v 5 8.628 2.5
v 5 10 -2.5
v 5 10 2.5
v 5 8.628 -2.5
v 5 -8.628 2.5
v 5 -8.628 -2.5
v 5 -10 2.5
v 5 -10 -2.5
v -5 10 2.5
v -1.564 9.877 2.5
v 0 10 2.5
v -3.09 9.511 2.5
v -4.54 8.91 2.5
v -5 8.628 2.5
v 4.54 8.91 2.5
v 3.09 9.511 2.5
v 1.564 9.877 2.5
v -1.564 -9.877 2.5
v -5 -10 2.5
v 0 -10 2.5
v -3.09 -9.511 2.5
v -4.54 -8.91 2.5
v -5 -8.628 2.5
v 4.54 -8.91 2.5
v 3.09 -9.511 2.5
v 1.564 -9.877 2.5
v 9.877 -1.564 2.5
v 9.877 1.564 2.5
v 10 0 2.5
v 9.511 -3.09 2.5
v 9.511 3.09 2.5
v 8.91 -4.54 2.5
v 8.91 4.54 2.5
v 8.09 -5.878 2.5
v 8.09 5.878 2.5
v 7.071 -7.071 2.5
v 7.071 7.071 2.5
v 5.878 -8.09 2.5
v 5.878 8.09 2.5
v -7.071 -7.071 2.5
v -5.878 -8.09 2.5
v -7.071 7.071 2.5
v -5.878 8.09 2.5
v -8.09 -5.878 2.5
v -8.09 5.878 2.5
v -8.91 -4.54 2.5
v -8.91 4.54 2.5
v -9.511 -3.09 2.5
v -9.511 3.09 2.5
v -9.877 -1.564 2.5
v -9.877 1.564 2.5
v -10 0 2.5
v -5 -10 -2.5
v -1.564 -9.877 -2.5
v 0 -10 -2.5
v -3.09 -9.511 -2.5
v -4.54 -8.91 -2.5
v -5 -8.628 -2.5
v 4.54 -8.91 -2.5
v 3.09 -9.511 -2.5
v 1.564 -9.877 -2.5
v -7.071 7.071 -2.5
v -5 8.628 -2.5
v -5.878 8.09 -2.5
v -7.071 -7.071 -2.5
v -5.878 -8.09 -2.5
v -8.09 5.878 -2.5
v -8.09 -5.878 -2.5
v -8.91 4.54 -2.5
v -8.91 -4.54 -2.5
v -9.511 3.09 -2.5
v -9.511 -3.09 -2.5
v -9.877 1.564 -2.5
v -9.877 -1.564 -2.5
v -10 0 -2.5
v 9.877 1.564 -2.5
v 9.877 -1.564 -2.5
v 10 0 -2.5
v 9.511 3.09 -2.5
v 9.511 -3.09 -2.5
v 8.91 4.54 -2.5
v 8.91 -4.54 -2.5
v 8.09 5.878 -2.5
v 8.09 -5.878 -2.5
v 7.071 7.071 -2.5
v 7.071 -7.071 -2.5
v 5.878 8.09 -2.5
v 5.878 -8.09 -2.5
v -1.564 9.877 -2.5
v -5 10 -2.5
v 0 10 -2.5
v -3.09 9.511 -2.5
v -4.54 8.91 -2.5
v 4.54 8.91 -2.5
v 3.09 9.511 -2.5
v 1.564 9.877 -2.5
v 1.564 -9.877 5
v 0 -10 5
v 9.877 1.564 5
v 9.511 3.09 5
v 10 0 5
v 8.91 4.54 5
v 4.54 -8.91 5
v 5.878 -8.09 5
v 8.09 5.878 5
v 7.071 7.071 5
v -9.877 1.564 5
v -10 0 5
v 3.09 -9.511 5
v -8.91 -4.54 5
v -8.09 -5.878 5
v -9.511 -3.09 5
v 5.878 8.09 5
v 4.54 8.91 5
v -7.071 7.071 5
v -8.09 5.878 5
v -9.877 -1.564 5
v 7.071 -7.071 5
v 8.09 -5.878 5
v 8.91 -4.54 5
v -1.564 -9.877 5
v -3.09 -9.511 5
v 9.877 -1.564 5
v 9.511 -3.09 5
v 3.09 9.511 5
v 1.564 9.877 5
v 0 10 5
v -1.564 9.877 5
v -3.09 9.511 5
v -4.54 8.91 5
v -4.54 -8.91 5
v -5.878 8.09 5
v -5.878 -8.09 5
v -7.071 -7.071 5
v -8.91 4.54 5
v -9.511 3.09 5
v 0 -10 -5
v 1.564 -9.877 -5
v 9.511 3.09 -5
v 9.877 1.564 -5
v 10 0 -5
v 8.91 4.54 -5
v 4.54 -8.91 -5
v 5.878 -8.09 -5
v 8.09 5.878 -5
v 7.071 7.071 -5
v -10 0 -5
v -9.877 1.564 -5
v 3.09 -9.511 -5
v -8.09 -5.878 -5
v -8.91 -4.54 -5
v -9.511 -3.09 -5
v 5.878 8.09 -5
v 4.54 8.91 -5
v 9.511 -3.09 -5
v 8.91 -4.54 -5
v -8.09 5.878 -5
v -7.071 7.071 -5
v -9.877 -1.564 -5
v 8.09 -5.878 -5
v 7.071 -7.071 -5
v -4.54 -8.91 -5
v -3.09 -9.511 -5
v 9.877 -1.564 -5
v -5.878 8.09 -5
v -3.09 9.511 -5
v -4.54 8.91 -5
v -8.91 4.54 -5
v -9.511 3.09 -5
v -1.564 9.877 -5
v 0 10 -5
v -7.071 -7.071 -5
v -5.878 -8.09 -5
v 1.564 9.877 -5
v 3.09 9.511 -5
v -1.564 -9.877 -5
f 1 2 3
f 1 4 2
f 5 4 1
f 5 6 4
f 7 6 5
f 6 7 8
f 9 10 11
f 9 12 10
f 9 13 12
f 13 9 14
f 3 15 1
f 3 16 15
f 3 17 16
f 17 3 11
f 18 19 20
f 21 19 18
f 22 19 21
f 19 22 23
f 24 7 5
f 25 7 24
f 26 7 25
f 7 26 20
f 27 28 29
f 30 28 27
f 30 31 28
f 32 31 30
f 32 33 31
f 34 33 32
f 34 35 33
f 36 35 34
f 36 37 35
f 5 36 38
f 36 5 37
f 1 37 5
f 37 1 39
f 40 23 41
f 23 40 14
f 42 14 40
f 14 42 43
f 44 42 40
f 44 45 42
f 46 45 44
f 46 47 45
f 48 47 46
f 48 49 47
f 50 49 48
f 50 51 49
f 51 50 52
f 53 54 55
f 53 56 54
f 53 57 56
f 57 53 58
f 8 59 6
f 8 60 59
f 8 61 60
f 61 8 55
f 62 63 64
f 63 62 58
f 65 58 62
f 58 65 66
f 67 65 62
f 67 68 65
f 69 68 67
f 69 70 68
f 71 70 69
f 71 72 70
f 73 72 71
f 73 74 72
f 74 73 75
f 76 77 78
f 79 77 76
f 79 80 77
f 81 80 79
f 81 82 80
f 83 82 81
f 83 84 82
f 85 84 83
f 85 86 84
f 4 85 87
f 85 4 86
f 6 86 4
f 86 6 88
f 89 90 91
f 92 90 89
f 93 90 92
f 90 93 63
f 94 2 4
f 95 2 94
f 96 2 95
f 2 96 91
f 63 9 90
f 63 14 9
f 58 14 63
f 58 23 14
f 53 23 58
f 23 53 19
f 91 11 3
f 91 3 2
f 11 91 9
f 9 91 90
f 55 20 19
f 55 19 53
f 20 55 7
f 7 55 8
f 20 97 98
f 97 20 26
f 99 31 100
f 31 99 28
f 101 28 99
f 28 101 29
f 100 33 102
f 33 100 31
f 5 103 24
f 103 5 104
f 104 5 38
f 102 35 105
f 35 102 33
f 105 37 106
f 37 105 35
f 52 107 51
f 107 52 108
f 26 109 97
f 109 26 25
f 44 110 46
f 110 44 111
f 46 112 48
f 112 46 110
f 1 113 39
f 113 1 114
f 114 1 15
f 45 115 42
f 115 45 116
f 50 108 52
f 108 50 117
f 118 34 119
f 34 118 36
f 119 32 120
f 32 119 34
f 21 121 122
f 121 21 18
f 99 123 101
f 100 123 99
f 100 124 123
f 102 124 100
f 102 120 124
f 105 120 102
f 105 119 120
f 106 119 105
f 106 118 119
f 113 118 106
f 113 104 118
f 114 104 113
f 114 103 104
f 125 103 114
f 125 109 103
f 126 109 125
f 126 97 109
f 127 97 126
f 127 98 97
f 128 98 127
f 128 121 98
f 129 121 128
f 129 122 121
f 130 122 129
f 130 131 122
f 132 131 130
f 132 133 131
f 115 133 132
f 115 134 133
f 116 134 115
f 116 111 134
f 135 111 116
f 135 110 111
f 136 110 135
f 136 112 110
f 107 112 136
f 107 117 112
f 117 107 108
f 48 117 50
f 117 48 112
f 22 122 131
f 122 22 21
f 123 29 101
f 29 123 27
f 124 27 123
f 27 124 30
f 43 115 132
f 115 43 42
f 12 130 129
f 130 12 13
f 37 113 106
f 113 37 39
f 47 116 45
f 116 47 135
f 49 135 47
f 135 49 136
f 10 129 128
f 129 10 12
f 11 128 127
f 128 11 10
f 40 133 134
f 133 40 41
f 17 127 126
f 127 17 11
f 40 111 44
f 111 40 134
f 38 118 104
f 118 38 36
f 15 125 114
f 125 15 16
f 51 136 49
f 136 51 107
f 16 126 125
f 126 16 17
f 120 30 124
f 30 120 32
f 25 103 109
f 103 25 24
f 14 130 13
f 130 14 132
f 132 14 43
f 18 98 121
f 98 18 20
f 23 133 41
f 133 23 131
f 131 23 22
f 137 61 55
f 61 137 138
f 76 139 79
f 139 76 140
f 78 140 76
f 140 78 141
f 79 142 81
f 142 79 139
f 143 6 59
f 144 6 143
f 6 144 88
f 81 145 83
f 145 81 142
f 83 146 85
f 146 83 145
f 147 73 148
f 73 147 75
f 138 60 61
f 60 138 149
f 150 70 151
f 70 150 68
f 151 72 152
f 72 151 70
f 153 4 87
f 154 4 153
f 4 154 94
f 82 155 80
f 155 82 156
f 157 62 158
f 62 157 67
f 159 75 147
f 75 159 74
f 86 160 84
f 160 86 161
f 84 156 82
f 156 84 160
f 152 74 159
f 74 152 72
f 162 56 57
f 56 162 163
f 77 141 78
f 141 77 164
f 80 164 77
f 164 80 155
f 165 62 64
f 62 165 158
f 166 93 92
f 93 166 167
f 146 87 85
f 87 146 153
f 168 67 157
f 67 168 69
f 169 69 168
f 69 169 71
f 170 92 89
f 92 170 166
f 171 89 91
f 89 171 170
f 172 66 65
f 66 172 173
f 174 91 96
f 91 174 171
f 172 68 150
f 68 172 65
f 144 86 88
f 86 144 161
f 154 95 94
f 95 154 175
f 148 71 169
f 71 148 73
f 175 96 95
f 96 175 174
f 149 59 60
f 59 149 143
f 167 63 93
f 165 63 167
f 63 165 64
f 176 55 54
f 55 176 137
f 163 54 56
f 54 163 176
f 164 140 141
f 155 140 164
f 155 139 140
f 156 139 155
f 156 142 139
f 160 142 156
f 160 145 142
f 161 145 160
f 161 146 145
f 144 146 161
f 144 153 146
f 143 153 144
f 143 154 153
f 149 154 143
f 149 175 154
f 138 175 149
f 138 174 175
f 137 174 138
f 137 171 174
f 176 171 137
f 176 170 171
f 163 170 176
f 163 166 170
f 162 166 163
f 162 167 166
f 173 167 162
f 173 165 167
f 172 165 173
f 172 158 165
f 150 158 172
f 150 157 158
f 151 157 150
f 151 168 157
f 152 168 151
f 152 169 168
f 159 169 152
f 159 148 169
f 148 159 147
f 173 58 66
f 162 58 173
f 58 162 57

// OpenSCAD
//Author: Chris Correll
//Date: 9/13/2022
//Description: Lesson 2.1 Variables and Parametric Programming Teacher 

//This is a variable it has two components, a name, var, and an assignment of value, 10, variables can not have spaces and must start with letters
var = 10;

//We want variable names to be descriptive var is a bad name, lets make our first variable

//In openSCAD you have to both declare (name) and intialize (assign a value) to variables from now on when I say declare I mean name and assign a value to

//When we use variables in our model we are "parameterizing" our model. When we define the shapes in our model in relation to the same variables we can easily change our model without having to rewrite a whole bunch of code

//Declare a variable "res" and make the global resolution equal to it
res = 40;
$fn = res;

//this is a pretty useless variable bc we probably wont use the resolution any where except here... go on to see why variables are useful
// you can shorten variables names to make it less work for you but make sure they are common shortenting and make sense within the context of your program ie w for width would make since but he for height would probably not


//Declare three variables w_cube, l_cube, h_cube
w_cube = 10;
l_cube = 20;
h_cube = 5;

//Make a centered cube with the variables
cube([w_cube,l_cube,h_cube], center=true);

// We can do math operations on variables like multiply * and divide / and addition + and subtraction - . These are known as special characters they can not be included in variable names. The only special character you should use in a variable name is _ 

//Make a centered cylinder that is half the height and twice the width of the cube by declaring a variable h_cyl and setting it equal to h/2 matybe change variable so its name is cube h and h_cylinder
h_cyl = h_cube/2;
w_cyl = 2*w_cube;

translate([0,0,h_cyl/2+h_cube/2]) //half the height of the cylinder moves it to touching the xy plane, half the height of the cuve
cylinder(d= w_cyl, h=h_cyl, center=true);

//move so we have a cylinder at the bottom too
translate([0,0,-h_cyl/2-h_cube/2]) //half the height of the cylinder moves it to touching the xy plane, half the height of the cuve
cylinder(d= 2*w_cube, h=h_cyl, center=true);

//Place the cylinder so that it is on top of the cube (hint remember where translation commands go)

//Change your variables and see how the shapes respond!
